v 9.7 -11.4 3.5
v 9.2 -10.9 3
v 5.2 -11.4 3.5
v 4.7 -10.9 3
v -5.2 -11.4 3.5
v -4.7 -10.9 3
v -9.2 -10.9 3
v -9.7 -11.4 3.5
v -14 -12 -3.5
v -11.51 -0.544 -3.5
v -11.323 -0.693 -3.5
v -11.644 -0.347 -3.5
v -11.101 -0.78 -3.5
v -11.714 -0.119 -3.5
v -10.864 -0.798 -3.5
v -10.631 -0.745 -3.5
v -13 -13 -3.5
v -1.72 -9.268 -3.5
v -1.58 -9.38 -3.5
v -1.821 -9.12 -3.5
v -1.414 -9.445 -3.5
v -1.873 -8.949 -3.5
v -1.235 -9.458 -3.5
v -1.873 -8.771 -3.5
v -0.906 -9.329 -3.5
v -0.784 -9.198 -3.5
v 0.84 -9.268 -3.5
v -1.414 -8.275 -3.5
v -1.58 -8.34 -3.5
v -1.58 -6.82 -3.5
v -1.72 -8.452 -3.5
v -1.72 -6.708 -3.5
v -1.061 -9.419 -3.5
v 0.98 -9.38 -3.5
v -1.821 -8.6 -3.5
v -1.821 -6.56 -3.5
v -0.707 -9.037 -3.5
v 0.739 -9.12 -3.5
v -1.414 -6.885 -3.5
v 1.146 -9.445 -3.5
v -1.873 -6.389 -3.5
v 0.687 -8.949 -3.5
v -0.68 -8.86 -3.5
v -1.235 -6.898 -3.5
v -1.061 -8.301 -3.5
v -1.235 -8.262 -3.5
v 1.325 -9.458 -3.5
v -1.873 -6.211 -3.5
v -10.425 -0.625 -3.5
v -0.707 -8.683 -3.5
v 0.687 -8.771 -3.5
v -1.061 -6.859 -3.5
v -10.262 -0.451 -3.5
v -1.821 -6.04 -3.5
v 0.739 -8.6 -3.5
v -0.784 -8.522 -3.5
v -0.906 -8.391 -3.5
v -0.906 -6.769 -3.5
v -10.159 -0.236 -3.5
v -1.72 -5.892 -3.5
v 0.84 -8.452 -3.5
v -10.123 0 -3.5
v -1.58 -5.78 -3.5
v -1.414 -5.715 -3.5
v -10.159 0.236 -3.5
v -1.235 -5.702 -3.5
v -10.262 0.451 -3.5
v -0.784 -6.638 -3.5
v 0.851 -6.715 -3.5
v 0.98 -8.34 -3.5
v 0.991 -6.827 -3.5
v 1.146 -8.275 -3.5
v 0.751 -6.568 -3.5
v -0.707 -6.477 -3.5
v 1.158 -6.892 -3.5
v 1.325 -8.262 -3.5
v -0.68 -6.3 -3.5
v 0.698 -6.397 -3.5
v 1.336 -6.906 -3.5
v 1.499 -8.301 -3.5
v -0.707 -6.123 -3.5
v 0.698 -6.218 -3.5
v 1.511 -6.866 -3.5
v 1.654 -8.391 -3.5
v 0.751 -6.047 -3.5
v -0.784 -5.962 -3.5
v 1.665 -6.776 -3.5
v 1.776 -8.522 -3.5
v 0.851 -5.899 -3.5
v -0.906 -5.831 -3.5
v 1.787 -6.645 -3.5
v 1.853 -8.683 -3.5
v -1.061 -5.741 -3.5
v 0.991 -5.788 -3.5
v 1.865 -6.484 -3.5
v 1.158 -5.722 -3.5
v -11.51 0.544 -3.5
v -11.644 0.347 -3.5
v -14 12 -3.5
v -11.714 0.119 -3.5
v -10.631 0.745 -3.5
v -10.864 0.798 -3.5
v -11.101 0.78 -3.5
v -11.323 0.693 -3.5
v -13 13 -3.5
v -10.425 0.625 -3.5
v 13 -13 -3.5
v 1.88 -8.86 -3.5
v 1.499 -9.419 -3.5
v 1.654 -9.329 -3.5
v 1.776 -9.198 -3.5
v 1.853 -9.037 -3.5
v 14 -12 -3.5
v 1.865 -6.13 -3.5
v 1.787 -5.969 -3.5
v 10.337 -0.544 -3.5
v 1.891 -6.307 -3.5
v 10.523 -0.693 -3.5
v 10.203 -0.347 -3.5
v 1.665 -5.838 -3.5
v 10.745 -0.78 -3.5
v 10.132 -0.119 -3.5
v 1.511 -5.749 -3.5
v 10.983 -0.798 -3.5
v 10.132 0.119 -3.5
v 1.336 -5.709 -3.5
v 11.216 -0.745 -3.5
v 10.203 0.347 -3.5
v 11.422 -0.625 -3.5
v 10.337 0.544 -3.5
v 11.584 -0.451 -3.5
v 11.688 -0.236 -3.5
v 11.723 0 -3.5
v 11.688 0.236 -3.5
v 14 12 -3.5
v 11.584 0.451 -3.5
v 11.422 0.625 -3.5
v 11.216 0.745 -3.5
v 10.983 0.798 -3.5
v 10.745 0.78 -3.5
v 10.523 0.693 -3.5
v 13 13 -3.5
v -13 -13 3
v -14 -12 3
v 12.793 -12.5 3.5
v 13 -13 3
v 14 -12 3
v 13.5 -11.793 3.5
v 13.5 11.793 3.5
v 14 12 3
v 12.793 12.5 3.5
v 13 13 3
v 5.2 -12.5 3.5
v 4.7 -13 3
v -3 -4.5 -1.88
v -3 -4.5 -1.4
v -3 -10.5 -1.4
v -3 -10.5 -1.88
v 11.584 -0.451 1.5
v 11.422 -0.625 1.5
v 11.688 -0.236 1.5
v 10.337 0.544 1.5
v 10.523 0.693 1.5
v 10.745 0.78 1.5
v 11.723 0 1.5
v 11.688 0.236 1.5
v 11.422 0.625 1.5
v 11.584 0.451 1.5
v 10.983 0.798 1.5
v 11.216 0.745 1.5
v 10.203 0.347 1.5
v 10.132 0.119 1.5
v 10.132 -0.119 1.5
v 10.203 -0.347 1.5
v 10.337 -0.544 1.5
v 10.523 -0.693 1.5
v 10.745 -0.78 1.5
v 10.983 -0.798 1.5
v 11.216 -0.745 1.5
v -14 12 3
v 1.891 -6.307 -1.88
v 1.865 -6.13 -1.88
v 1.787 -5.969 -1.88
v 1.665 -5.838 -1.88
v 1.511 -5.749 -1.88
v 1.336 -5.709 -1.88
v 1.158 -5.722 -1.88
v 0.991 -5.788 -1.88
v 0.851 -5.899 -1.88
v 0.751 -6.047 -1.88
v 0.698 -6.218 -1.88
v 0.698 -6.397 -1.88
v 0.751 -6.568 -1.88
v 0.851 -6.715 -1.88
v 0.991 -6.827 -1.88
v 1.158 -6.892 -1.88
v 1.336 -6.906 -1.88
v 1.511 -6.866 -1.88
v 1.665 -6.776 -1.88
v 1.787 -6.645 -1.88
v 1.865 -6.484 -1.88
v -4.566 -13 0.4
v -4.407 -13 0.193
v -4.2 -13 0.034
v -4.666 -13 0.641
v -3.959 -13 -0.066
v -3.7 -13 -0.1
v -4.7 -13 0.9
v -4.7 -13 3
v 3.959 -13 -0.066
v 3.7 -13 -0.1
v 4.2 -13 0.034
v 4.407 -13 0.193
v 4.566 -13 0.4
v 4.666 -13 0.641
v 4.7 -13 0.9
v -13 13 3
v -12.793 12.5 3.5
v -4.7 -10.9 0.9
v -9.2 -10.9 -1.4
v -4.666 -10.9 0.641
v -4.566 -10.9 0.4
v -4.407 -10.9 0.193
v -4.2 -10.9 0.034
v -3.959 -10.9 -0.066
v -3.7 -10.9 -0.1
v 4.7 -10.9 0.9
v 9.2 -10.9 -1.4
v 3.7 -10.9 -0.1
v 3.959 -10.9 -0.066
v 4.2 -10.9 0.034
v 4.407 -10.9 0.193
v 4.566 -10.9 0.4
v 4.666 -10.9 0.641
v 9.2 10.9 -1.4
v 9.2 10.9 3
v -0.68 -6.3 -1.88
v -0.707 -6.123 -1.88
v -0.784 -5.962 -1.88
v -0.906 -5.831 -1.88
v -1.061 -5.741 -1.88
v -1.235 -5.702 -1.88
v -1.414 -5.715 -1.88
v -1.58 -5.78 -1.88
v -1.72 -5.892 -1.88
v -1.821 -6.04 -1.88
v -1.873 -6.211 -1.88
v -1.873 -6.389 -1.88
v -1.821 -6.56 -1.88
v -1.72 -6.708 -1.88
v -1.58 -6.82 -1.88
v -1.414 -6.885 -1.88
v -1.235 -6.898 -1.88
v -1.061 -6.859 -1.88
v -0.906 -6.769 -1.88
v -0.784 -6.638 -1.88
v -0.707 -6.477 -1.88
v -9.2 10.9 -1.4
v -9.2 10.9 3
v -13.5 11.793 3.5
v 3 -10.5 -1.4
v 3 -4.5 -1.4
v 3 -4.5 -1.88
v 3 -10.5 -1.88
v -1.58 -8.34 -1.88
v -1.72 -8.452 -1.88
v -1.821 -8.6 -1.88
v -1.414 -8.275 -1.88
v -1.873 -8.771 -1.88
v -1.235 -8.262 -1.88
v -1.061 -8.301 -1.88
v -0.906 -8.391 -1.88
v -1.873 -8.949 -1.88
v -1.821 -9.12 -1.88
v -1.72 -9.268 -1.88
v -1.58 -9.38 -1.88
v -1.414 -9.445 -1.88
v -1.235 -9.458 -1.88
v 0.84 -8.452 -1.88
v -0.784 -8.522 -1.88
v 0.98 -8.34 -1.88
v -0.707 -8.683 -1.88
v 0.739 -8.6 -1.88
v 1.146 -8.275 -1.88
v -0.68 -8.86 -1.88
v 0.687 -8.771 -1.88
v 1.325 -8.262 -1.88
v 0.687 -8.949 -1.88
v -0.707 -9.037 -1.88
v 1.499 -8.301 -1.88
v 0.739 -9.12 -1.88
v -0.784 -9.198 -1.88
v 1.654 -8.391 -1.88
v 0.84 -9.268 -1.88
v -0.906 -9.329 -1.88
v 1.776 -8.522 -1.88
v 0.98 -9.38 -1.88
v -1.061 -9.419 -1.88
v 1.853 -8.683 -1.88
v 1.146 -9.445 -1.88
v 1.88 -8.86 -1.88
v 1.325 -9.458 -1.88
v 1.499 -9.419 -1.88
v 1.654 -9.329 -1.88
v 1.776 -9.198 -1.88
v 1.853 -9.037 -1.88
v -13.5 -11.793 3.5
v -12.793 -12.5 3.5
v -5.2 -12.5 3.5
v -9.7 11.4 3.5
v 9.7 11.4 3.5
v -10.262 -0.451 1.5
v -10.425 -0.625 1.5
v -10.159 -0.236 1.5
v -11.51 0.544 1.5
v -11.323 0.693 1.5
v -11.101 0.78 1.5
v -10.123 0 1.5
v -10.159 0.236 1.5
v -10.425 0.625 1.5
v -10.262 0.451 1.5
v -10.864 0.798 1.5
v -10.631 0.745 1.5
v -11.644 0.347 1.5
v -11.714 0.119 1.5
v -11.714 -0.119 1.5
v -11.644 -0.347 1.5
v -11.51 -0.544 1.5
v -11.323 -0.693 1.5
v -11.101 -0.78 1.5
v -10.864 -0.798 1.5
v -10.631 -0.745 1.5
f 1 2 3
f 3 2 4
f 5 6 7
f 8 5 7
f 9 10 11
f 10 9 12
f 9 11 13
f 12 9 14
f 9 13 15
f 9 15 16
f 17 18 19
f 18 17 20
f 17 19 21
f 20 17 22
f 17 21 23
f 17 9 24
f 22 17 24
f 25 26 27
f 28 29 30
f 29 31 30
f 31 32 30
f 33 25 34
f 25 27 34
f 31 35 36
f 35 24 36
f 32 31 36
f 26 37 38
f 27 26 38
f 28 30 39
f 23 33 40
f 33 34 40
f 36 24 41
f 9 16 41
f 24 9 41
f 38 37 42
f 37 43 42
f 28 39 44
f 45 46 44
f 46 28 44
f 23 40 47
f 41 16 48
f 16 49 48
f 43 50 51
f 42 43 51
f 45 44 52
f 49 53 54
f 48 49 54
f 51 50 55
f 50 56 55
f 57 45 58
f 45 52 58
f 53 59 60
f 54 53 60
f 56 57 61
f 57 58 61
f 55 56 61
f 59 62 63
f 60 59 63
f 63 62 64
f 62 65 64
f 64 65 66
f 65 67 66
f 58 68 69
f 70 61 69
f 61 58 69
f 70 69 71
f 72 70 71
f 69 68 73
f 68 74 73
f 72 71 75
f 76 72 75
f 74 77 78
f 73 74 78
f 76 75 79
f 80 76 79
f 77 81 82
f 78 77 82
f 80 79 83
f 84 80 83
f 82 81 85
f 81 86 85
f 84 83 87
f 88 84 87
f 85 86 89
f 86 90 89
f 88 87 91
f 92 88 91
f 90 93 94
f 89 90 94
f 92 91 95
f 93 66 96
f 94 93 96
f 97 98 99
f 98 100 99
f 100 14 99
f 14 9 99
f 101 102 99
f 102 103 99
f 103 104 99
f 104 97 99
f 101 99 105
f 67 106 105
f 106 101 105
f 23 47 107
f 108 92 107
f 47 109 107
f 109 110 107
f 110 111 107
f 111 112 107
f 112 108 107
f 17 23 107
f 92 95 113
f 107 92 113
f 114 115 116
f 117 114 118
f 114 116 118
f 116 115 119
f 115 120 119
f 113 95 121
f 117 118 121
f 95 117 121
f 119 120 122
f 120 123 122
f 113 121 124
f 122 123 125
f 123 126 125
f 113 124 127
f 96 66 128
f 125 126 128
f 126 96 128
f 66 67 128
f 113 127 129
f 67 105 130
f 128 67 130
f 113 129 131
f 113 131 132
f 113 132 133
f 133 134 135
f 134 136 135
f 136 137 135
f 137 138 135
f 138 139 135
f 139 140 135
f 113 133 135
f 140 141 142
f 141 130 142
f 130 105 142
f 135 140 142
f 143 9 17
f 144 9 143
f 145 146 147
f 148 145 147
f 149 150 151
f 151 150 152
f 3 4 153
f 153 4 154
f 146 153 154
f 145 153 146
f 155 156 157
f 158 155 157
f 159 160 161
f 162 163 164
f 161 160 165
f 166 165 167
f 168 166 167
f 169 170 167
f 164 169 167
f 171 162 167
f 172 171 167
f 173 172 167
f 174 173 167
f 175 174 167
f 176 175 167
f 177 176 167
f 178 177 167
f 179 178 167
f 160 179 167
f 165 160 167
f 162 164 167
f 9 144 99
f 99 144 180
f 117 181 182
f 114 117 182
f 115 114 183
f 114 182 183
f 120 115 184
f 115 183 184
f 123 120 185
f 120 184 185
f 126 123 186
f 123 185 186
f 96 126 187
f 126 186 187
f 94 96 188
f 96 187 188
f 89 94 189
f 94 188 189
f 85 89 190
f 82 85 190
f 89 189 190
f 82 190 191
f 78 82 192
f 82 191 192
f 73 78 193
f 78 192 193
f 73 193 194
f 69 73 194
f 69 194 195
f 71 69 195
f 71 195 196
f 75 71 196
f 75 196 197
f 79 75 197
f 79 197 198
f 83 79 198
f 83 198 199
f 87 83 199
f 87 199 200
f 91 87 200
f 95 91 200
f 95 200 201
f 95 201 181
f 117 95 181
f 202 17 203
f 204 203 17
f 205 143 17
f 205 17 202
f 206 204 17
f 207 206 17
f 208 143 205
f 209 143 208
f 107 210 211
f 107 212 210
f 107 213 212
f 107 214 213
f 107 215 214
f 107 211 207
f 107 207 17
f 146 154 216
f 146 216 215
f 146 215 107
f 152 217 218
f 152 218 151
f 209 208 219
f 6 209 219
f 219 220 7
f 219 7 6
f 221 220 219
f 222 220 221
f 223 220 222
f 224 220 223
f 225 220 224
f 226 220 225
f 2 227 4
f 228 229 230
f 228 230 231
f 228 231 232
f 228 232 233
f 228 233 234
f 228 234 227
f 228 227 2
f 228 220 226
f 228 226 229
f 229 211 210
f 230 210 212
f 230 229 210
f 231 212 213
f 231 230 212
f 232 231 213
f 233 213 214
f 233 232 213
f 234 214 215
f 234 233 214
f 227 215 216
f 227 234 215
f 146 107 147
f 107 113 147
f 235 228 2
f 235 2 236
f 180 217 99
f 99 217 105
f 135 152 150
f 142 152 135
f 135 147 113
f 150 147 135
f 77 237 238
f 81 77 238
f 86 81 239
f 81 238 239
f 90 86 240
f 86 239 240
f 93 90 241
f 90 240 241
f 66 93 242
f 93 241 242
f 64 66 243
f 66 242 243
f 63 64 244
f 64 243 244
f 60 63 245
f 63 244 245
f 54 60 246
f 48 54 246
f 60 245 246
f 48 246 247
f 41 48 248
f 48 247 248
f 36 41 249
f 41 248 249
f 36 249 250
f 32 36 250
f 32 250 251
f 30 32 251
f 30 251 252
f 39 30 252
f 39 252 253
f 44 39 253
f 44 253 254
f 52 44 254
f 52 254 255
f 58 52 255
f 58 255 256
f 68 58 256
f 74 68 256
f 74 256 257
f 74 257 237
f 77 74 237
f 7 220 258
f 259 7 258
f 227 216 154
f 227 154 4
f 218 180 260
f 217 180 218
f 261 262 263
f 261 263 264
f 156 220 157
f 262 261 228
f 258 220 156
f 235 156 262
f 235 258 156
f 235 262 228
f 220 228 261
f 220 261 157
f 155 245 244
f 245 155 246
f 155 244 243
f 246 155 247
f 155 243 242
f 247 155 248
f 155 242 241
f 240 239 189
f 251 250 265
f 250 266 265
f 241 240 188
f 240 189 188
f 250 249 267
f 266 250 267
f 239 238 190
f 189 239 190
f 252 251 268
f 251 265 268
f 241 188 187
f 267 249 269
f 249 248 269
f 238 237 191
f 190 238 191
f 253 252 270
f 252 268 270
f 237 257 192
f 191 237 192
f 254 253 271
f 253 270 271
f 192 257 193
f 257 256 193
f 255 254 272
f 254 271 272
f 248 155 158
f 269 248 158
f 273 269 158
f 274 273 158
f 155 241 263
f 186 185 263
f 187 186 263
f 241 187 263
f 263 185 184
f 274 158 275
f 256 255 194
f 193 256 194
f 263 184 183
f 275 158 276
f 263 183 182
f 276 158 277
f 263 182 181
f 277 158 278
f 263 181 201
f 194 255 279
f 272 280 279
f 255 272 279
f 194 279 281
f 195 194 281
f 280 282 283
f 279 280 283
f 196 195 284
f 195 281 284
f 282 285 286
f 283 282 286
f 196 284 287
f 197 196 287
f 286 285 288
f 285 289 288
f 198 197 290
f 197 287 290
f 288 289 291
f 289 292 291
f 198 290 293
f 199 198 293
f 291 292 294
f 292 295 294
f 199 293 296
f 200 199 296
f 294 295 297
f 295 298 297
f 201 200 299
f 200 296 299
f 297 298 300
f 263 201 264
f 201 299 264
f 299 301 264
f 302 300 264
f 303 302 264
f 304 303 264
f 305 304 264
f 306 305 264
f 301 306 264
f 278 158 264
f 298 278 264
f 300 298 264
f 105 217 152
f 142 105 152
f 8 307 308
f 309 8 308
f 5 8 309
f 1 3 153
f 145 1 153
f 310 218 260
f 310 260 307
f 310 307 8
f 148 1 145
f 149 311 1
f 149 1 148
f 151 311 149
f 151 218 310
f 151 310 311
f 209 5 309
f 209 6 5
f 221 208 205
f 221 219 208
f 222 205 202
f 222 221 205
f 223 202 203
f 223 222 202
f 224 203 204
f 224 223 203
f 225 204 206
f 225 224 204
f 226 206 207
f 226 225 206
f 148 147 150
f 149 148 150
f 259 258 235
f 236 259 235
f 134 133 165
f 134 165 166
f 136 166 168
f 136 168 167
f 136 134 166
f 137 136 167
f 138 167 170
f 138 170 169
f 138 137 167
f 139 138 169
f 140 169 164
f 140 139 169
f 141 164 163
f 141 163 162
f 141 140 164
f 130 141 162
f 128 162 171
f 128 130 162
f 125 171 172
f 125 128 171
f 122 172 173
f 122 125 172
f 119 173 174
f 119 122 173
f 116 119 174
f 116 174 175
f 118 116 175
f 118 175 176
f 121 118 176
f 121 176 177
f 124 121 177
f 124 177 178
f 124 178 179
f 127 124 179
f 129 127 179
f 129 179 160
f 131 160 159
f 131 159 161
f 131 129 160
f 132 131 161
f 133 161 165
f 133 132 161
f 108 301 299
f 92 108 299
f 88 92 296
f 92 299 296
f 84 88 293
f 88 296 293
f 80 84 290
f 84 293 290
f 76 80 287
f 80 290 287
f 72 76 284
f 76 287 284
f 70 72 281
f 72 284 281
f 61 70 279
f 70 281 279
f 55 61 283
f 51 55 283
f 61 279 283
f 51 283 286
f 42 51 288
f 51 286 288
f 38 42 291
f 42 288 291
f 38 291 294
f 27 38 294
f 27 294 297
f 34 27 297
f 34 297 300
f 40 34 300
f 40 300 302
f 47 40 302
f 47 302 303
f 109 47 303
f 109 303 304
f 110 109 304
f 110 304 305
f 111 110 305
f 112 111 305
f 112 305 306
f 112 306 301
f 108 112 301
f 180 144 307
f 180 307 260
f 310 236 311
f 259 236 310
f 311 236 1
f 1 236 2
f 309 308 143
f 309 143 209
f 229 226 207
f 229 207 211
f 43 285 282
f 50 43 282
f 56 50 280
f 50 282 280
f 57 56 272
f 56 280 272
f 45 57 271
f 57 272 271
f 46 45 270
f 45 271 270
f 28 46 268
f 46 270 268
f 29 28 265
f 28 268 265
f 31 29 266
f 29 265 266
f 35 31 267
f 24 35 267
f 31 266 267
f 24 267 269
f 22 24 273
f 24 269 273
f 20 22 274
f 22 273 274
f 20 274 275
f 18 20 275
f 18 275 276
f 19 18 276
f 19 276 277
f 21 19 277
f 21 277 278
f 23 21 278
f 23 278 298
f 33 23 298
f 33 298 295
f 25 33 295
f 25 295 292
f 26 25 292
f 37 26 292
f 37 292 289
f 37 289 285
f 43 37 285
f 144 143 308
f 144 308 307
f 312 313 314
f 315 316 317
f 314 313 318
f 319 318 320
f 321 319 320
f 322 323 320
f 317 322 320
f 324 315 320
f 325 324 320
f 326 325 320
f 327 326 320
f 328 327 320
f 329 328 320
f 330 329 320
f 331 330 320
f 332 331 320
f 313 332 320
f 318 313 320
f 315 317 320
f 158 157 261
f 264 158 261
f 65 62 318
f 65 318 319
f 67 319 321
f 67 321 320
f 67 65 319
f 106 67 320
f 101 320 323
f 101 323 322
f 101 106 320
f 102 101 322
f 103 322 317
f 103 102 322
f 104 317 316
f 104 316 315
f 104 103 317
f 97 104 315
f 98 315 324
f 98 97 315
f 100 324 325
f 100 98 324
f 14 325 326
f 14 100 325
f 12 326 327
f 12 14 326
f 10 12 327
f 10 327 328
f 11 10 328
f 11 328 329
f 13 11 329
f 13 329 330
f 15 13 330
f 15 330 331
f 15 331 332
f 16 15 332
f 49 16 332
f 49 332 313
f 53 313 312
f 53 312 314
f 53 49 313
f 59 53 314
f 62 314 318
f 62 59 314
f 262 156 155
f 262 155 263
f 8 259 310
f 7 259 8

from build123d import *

# Parameters (mm, degrees)
SKETCH_W        = 28
SKETCH_H        = 26
PAD_DEPTH       = 3.5
SKETCH001_W     = 18.4
SKETCH001_H     = 21.8
POCKET_DEPTH    = 5
SKETCH002_W     = 9.4
SKETCH002_H     = 3
POCKET001_DEPTH = 5
SKETCH003_W     = 6
SKETCH003_H     = 6
POCKET002_DEPTH = 0.5
SKETCH004_R     = 0.6
POCKET003_DEPTH = 5
SKETCH010_R     = 0.8
POCKET006_DEPTH = 5
CHAMFER001_SIZE = 0.5
FILLET_R        = 1
CHAMFER002_SIZE = 1
CHAMFER003_SIZE = 0.5


with BuildPart() as part:
    # Sketch → Pad (new body, symmetric)
    with BuildSketch(Plane.XY):
        Rectangle(SKETCH_W, SKETCH_H)
    extrude(amount=PAD_DEPTH, both=True)

    # Sketch001 → Pocket (cut)
    with BuildSketch(Plane.XY.offset(-1.4)):
        Rectangle(SKETCH001_W, SKETCH001_H)
    extrude(amount=POCKET_DEPTH, mode=Mode.SUBTRACT)

    # Sketch002 → Pocket001 (cut)
    with BuildSketch(Plane.XY.offset(-0.1)):
        with Locations((0, -11.98)):
            Rectangle(SKETCH002_W, SKETCH002_H)
    extrude(amount=POCKET001_DEPTH, mode=Mode.SUBTRACT)

    # Sketch003 (on Face4 of Pocket001) → Pocket002 (cut)
    with BuildSketch(Plane(origin=(0, -7.5, -1.38), x_dir=(1, 0, 0), z_dir=(0, 0, -1))):
        Rectangle(SKETCH003_W, SKETCH003_H)
    extrude(amount=POCKET002_DEPTH, mode=Mode.SUBTRACT)

    # Sketch004 → Pocket003 (cut)
    with BuildSketch(Plane(origin=(0, -7.58, -1.3), x_dir=(1, 0, 0), z_dir=(0, 0, 1))):
        with Locations((-1.28, 1.28)):
            Circle(SKETCH004_R)
        with Locations((1.291315, 1.272746)):
            Circle(SKETCH004_R)
        with Locations((-1.28, -1.28)):
            Circle(SKETCH004_R)
        with Locations((1.28, -1.28)):
            Circle(SKETCH004_R)
    extrude(amount=-POCKET003_DEPTH, mode=Mode.SUBTRACT)

    # Sketch010 → Pocket006 (cut)
    with BuildSketch(Plane.XY.offset(-3.5)):
        with Locations((-10.923356, 0)):
            Circle(SKETCH010_R)
        with Locations((10.923356, 0)):
            Circle(SKETCH010_R)
    extrude(amount=POCKET006_DEPTH, mode=Mode.SUBTRACT)

    # Chamfer001
    chamfer001_edges = [part.edges().sort_by_distance(p)[0] for p in [
        (-9.2, 0, 3.5),
        (-4.7, -11.95, 3.5),
        (-6.95, -10.9, 3.5),
        (4.7, -11.95, 3.5),
        (6.95, -10.9, 3.5),
        (9.2, 0, 3.5),
        (0, 10.9, 3.5),
    ]]
    chamfer(chamfer001_edges, length=CHAMFER001_SIZE)

    # Fillet
    fillet_edges = [part.edges().sort_by_distance(p)[0] for p in [
        (-4.7, -11.95, -0.1),
        (4.7, -11.95, -0.1),
    ]]
    fillet(fillet_edges, radius=FILLET_R)

    # Chamfer002
    chamfer002_edges = [part.edges().sort_by_distance(p)[0] for p in [
        (14, -13, 0),
        (14, 13, 0),
        (-14, 13, 0),
        (-14, -13, 0),
    ]]
    chamfer(chamfer002_edges, length=CHAMFER002_SIZE)

    # Chamfer003
    chamfer003_edges = [part.edges().sort_by_distance(p)[0] for p in [
        (-14, 0, 3.5),
        (-13.5, -12.5, 3.5),
        (-9.1, -13, 3.5),
        (9.1, -13, 3.5),
        (13.5, -12.5, 3.5),
        (14, 0, 3.5),
        (-13.5, 12.5, 3.5),
        (0, 13, 3.5),
        (13.5, 12.5, 3.5),
    ]]
    chamfer(chamfer003_edges, length=CHAMFER003_SIZE)


solid = part.part
